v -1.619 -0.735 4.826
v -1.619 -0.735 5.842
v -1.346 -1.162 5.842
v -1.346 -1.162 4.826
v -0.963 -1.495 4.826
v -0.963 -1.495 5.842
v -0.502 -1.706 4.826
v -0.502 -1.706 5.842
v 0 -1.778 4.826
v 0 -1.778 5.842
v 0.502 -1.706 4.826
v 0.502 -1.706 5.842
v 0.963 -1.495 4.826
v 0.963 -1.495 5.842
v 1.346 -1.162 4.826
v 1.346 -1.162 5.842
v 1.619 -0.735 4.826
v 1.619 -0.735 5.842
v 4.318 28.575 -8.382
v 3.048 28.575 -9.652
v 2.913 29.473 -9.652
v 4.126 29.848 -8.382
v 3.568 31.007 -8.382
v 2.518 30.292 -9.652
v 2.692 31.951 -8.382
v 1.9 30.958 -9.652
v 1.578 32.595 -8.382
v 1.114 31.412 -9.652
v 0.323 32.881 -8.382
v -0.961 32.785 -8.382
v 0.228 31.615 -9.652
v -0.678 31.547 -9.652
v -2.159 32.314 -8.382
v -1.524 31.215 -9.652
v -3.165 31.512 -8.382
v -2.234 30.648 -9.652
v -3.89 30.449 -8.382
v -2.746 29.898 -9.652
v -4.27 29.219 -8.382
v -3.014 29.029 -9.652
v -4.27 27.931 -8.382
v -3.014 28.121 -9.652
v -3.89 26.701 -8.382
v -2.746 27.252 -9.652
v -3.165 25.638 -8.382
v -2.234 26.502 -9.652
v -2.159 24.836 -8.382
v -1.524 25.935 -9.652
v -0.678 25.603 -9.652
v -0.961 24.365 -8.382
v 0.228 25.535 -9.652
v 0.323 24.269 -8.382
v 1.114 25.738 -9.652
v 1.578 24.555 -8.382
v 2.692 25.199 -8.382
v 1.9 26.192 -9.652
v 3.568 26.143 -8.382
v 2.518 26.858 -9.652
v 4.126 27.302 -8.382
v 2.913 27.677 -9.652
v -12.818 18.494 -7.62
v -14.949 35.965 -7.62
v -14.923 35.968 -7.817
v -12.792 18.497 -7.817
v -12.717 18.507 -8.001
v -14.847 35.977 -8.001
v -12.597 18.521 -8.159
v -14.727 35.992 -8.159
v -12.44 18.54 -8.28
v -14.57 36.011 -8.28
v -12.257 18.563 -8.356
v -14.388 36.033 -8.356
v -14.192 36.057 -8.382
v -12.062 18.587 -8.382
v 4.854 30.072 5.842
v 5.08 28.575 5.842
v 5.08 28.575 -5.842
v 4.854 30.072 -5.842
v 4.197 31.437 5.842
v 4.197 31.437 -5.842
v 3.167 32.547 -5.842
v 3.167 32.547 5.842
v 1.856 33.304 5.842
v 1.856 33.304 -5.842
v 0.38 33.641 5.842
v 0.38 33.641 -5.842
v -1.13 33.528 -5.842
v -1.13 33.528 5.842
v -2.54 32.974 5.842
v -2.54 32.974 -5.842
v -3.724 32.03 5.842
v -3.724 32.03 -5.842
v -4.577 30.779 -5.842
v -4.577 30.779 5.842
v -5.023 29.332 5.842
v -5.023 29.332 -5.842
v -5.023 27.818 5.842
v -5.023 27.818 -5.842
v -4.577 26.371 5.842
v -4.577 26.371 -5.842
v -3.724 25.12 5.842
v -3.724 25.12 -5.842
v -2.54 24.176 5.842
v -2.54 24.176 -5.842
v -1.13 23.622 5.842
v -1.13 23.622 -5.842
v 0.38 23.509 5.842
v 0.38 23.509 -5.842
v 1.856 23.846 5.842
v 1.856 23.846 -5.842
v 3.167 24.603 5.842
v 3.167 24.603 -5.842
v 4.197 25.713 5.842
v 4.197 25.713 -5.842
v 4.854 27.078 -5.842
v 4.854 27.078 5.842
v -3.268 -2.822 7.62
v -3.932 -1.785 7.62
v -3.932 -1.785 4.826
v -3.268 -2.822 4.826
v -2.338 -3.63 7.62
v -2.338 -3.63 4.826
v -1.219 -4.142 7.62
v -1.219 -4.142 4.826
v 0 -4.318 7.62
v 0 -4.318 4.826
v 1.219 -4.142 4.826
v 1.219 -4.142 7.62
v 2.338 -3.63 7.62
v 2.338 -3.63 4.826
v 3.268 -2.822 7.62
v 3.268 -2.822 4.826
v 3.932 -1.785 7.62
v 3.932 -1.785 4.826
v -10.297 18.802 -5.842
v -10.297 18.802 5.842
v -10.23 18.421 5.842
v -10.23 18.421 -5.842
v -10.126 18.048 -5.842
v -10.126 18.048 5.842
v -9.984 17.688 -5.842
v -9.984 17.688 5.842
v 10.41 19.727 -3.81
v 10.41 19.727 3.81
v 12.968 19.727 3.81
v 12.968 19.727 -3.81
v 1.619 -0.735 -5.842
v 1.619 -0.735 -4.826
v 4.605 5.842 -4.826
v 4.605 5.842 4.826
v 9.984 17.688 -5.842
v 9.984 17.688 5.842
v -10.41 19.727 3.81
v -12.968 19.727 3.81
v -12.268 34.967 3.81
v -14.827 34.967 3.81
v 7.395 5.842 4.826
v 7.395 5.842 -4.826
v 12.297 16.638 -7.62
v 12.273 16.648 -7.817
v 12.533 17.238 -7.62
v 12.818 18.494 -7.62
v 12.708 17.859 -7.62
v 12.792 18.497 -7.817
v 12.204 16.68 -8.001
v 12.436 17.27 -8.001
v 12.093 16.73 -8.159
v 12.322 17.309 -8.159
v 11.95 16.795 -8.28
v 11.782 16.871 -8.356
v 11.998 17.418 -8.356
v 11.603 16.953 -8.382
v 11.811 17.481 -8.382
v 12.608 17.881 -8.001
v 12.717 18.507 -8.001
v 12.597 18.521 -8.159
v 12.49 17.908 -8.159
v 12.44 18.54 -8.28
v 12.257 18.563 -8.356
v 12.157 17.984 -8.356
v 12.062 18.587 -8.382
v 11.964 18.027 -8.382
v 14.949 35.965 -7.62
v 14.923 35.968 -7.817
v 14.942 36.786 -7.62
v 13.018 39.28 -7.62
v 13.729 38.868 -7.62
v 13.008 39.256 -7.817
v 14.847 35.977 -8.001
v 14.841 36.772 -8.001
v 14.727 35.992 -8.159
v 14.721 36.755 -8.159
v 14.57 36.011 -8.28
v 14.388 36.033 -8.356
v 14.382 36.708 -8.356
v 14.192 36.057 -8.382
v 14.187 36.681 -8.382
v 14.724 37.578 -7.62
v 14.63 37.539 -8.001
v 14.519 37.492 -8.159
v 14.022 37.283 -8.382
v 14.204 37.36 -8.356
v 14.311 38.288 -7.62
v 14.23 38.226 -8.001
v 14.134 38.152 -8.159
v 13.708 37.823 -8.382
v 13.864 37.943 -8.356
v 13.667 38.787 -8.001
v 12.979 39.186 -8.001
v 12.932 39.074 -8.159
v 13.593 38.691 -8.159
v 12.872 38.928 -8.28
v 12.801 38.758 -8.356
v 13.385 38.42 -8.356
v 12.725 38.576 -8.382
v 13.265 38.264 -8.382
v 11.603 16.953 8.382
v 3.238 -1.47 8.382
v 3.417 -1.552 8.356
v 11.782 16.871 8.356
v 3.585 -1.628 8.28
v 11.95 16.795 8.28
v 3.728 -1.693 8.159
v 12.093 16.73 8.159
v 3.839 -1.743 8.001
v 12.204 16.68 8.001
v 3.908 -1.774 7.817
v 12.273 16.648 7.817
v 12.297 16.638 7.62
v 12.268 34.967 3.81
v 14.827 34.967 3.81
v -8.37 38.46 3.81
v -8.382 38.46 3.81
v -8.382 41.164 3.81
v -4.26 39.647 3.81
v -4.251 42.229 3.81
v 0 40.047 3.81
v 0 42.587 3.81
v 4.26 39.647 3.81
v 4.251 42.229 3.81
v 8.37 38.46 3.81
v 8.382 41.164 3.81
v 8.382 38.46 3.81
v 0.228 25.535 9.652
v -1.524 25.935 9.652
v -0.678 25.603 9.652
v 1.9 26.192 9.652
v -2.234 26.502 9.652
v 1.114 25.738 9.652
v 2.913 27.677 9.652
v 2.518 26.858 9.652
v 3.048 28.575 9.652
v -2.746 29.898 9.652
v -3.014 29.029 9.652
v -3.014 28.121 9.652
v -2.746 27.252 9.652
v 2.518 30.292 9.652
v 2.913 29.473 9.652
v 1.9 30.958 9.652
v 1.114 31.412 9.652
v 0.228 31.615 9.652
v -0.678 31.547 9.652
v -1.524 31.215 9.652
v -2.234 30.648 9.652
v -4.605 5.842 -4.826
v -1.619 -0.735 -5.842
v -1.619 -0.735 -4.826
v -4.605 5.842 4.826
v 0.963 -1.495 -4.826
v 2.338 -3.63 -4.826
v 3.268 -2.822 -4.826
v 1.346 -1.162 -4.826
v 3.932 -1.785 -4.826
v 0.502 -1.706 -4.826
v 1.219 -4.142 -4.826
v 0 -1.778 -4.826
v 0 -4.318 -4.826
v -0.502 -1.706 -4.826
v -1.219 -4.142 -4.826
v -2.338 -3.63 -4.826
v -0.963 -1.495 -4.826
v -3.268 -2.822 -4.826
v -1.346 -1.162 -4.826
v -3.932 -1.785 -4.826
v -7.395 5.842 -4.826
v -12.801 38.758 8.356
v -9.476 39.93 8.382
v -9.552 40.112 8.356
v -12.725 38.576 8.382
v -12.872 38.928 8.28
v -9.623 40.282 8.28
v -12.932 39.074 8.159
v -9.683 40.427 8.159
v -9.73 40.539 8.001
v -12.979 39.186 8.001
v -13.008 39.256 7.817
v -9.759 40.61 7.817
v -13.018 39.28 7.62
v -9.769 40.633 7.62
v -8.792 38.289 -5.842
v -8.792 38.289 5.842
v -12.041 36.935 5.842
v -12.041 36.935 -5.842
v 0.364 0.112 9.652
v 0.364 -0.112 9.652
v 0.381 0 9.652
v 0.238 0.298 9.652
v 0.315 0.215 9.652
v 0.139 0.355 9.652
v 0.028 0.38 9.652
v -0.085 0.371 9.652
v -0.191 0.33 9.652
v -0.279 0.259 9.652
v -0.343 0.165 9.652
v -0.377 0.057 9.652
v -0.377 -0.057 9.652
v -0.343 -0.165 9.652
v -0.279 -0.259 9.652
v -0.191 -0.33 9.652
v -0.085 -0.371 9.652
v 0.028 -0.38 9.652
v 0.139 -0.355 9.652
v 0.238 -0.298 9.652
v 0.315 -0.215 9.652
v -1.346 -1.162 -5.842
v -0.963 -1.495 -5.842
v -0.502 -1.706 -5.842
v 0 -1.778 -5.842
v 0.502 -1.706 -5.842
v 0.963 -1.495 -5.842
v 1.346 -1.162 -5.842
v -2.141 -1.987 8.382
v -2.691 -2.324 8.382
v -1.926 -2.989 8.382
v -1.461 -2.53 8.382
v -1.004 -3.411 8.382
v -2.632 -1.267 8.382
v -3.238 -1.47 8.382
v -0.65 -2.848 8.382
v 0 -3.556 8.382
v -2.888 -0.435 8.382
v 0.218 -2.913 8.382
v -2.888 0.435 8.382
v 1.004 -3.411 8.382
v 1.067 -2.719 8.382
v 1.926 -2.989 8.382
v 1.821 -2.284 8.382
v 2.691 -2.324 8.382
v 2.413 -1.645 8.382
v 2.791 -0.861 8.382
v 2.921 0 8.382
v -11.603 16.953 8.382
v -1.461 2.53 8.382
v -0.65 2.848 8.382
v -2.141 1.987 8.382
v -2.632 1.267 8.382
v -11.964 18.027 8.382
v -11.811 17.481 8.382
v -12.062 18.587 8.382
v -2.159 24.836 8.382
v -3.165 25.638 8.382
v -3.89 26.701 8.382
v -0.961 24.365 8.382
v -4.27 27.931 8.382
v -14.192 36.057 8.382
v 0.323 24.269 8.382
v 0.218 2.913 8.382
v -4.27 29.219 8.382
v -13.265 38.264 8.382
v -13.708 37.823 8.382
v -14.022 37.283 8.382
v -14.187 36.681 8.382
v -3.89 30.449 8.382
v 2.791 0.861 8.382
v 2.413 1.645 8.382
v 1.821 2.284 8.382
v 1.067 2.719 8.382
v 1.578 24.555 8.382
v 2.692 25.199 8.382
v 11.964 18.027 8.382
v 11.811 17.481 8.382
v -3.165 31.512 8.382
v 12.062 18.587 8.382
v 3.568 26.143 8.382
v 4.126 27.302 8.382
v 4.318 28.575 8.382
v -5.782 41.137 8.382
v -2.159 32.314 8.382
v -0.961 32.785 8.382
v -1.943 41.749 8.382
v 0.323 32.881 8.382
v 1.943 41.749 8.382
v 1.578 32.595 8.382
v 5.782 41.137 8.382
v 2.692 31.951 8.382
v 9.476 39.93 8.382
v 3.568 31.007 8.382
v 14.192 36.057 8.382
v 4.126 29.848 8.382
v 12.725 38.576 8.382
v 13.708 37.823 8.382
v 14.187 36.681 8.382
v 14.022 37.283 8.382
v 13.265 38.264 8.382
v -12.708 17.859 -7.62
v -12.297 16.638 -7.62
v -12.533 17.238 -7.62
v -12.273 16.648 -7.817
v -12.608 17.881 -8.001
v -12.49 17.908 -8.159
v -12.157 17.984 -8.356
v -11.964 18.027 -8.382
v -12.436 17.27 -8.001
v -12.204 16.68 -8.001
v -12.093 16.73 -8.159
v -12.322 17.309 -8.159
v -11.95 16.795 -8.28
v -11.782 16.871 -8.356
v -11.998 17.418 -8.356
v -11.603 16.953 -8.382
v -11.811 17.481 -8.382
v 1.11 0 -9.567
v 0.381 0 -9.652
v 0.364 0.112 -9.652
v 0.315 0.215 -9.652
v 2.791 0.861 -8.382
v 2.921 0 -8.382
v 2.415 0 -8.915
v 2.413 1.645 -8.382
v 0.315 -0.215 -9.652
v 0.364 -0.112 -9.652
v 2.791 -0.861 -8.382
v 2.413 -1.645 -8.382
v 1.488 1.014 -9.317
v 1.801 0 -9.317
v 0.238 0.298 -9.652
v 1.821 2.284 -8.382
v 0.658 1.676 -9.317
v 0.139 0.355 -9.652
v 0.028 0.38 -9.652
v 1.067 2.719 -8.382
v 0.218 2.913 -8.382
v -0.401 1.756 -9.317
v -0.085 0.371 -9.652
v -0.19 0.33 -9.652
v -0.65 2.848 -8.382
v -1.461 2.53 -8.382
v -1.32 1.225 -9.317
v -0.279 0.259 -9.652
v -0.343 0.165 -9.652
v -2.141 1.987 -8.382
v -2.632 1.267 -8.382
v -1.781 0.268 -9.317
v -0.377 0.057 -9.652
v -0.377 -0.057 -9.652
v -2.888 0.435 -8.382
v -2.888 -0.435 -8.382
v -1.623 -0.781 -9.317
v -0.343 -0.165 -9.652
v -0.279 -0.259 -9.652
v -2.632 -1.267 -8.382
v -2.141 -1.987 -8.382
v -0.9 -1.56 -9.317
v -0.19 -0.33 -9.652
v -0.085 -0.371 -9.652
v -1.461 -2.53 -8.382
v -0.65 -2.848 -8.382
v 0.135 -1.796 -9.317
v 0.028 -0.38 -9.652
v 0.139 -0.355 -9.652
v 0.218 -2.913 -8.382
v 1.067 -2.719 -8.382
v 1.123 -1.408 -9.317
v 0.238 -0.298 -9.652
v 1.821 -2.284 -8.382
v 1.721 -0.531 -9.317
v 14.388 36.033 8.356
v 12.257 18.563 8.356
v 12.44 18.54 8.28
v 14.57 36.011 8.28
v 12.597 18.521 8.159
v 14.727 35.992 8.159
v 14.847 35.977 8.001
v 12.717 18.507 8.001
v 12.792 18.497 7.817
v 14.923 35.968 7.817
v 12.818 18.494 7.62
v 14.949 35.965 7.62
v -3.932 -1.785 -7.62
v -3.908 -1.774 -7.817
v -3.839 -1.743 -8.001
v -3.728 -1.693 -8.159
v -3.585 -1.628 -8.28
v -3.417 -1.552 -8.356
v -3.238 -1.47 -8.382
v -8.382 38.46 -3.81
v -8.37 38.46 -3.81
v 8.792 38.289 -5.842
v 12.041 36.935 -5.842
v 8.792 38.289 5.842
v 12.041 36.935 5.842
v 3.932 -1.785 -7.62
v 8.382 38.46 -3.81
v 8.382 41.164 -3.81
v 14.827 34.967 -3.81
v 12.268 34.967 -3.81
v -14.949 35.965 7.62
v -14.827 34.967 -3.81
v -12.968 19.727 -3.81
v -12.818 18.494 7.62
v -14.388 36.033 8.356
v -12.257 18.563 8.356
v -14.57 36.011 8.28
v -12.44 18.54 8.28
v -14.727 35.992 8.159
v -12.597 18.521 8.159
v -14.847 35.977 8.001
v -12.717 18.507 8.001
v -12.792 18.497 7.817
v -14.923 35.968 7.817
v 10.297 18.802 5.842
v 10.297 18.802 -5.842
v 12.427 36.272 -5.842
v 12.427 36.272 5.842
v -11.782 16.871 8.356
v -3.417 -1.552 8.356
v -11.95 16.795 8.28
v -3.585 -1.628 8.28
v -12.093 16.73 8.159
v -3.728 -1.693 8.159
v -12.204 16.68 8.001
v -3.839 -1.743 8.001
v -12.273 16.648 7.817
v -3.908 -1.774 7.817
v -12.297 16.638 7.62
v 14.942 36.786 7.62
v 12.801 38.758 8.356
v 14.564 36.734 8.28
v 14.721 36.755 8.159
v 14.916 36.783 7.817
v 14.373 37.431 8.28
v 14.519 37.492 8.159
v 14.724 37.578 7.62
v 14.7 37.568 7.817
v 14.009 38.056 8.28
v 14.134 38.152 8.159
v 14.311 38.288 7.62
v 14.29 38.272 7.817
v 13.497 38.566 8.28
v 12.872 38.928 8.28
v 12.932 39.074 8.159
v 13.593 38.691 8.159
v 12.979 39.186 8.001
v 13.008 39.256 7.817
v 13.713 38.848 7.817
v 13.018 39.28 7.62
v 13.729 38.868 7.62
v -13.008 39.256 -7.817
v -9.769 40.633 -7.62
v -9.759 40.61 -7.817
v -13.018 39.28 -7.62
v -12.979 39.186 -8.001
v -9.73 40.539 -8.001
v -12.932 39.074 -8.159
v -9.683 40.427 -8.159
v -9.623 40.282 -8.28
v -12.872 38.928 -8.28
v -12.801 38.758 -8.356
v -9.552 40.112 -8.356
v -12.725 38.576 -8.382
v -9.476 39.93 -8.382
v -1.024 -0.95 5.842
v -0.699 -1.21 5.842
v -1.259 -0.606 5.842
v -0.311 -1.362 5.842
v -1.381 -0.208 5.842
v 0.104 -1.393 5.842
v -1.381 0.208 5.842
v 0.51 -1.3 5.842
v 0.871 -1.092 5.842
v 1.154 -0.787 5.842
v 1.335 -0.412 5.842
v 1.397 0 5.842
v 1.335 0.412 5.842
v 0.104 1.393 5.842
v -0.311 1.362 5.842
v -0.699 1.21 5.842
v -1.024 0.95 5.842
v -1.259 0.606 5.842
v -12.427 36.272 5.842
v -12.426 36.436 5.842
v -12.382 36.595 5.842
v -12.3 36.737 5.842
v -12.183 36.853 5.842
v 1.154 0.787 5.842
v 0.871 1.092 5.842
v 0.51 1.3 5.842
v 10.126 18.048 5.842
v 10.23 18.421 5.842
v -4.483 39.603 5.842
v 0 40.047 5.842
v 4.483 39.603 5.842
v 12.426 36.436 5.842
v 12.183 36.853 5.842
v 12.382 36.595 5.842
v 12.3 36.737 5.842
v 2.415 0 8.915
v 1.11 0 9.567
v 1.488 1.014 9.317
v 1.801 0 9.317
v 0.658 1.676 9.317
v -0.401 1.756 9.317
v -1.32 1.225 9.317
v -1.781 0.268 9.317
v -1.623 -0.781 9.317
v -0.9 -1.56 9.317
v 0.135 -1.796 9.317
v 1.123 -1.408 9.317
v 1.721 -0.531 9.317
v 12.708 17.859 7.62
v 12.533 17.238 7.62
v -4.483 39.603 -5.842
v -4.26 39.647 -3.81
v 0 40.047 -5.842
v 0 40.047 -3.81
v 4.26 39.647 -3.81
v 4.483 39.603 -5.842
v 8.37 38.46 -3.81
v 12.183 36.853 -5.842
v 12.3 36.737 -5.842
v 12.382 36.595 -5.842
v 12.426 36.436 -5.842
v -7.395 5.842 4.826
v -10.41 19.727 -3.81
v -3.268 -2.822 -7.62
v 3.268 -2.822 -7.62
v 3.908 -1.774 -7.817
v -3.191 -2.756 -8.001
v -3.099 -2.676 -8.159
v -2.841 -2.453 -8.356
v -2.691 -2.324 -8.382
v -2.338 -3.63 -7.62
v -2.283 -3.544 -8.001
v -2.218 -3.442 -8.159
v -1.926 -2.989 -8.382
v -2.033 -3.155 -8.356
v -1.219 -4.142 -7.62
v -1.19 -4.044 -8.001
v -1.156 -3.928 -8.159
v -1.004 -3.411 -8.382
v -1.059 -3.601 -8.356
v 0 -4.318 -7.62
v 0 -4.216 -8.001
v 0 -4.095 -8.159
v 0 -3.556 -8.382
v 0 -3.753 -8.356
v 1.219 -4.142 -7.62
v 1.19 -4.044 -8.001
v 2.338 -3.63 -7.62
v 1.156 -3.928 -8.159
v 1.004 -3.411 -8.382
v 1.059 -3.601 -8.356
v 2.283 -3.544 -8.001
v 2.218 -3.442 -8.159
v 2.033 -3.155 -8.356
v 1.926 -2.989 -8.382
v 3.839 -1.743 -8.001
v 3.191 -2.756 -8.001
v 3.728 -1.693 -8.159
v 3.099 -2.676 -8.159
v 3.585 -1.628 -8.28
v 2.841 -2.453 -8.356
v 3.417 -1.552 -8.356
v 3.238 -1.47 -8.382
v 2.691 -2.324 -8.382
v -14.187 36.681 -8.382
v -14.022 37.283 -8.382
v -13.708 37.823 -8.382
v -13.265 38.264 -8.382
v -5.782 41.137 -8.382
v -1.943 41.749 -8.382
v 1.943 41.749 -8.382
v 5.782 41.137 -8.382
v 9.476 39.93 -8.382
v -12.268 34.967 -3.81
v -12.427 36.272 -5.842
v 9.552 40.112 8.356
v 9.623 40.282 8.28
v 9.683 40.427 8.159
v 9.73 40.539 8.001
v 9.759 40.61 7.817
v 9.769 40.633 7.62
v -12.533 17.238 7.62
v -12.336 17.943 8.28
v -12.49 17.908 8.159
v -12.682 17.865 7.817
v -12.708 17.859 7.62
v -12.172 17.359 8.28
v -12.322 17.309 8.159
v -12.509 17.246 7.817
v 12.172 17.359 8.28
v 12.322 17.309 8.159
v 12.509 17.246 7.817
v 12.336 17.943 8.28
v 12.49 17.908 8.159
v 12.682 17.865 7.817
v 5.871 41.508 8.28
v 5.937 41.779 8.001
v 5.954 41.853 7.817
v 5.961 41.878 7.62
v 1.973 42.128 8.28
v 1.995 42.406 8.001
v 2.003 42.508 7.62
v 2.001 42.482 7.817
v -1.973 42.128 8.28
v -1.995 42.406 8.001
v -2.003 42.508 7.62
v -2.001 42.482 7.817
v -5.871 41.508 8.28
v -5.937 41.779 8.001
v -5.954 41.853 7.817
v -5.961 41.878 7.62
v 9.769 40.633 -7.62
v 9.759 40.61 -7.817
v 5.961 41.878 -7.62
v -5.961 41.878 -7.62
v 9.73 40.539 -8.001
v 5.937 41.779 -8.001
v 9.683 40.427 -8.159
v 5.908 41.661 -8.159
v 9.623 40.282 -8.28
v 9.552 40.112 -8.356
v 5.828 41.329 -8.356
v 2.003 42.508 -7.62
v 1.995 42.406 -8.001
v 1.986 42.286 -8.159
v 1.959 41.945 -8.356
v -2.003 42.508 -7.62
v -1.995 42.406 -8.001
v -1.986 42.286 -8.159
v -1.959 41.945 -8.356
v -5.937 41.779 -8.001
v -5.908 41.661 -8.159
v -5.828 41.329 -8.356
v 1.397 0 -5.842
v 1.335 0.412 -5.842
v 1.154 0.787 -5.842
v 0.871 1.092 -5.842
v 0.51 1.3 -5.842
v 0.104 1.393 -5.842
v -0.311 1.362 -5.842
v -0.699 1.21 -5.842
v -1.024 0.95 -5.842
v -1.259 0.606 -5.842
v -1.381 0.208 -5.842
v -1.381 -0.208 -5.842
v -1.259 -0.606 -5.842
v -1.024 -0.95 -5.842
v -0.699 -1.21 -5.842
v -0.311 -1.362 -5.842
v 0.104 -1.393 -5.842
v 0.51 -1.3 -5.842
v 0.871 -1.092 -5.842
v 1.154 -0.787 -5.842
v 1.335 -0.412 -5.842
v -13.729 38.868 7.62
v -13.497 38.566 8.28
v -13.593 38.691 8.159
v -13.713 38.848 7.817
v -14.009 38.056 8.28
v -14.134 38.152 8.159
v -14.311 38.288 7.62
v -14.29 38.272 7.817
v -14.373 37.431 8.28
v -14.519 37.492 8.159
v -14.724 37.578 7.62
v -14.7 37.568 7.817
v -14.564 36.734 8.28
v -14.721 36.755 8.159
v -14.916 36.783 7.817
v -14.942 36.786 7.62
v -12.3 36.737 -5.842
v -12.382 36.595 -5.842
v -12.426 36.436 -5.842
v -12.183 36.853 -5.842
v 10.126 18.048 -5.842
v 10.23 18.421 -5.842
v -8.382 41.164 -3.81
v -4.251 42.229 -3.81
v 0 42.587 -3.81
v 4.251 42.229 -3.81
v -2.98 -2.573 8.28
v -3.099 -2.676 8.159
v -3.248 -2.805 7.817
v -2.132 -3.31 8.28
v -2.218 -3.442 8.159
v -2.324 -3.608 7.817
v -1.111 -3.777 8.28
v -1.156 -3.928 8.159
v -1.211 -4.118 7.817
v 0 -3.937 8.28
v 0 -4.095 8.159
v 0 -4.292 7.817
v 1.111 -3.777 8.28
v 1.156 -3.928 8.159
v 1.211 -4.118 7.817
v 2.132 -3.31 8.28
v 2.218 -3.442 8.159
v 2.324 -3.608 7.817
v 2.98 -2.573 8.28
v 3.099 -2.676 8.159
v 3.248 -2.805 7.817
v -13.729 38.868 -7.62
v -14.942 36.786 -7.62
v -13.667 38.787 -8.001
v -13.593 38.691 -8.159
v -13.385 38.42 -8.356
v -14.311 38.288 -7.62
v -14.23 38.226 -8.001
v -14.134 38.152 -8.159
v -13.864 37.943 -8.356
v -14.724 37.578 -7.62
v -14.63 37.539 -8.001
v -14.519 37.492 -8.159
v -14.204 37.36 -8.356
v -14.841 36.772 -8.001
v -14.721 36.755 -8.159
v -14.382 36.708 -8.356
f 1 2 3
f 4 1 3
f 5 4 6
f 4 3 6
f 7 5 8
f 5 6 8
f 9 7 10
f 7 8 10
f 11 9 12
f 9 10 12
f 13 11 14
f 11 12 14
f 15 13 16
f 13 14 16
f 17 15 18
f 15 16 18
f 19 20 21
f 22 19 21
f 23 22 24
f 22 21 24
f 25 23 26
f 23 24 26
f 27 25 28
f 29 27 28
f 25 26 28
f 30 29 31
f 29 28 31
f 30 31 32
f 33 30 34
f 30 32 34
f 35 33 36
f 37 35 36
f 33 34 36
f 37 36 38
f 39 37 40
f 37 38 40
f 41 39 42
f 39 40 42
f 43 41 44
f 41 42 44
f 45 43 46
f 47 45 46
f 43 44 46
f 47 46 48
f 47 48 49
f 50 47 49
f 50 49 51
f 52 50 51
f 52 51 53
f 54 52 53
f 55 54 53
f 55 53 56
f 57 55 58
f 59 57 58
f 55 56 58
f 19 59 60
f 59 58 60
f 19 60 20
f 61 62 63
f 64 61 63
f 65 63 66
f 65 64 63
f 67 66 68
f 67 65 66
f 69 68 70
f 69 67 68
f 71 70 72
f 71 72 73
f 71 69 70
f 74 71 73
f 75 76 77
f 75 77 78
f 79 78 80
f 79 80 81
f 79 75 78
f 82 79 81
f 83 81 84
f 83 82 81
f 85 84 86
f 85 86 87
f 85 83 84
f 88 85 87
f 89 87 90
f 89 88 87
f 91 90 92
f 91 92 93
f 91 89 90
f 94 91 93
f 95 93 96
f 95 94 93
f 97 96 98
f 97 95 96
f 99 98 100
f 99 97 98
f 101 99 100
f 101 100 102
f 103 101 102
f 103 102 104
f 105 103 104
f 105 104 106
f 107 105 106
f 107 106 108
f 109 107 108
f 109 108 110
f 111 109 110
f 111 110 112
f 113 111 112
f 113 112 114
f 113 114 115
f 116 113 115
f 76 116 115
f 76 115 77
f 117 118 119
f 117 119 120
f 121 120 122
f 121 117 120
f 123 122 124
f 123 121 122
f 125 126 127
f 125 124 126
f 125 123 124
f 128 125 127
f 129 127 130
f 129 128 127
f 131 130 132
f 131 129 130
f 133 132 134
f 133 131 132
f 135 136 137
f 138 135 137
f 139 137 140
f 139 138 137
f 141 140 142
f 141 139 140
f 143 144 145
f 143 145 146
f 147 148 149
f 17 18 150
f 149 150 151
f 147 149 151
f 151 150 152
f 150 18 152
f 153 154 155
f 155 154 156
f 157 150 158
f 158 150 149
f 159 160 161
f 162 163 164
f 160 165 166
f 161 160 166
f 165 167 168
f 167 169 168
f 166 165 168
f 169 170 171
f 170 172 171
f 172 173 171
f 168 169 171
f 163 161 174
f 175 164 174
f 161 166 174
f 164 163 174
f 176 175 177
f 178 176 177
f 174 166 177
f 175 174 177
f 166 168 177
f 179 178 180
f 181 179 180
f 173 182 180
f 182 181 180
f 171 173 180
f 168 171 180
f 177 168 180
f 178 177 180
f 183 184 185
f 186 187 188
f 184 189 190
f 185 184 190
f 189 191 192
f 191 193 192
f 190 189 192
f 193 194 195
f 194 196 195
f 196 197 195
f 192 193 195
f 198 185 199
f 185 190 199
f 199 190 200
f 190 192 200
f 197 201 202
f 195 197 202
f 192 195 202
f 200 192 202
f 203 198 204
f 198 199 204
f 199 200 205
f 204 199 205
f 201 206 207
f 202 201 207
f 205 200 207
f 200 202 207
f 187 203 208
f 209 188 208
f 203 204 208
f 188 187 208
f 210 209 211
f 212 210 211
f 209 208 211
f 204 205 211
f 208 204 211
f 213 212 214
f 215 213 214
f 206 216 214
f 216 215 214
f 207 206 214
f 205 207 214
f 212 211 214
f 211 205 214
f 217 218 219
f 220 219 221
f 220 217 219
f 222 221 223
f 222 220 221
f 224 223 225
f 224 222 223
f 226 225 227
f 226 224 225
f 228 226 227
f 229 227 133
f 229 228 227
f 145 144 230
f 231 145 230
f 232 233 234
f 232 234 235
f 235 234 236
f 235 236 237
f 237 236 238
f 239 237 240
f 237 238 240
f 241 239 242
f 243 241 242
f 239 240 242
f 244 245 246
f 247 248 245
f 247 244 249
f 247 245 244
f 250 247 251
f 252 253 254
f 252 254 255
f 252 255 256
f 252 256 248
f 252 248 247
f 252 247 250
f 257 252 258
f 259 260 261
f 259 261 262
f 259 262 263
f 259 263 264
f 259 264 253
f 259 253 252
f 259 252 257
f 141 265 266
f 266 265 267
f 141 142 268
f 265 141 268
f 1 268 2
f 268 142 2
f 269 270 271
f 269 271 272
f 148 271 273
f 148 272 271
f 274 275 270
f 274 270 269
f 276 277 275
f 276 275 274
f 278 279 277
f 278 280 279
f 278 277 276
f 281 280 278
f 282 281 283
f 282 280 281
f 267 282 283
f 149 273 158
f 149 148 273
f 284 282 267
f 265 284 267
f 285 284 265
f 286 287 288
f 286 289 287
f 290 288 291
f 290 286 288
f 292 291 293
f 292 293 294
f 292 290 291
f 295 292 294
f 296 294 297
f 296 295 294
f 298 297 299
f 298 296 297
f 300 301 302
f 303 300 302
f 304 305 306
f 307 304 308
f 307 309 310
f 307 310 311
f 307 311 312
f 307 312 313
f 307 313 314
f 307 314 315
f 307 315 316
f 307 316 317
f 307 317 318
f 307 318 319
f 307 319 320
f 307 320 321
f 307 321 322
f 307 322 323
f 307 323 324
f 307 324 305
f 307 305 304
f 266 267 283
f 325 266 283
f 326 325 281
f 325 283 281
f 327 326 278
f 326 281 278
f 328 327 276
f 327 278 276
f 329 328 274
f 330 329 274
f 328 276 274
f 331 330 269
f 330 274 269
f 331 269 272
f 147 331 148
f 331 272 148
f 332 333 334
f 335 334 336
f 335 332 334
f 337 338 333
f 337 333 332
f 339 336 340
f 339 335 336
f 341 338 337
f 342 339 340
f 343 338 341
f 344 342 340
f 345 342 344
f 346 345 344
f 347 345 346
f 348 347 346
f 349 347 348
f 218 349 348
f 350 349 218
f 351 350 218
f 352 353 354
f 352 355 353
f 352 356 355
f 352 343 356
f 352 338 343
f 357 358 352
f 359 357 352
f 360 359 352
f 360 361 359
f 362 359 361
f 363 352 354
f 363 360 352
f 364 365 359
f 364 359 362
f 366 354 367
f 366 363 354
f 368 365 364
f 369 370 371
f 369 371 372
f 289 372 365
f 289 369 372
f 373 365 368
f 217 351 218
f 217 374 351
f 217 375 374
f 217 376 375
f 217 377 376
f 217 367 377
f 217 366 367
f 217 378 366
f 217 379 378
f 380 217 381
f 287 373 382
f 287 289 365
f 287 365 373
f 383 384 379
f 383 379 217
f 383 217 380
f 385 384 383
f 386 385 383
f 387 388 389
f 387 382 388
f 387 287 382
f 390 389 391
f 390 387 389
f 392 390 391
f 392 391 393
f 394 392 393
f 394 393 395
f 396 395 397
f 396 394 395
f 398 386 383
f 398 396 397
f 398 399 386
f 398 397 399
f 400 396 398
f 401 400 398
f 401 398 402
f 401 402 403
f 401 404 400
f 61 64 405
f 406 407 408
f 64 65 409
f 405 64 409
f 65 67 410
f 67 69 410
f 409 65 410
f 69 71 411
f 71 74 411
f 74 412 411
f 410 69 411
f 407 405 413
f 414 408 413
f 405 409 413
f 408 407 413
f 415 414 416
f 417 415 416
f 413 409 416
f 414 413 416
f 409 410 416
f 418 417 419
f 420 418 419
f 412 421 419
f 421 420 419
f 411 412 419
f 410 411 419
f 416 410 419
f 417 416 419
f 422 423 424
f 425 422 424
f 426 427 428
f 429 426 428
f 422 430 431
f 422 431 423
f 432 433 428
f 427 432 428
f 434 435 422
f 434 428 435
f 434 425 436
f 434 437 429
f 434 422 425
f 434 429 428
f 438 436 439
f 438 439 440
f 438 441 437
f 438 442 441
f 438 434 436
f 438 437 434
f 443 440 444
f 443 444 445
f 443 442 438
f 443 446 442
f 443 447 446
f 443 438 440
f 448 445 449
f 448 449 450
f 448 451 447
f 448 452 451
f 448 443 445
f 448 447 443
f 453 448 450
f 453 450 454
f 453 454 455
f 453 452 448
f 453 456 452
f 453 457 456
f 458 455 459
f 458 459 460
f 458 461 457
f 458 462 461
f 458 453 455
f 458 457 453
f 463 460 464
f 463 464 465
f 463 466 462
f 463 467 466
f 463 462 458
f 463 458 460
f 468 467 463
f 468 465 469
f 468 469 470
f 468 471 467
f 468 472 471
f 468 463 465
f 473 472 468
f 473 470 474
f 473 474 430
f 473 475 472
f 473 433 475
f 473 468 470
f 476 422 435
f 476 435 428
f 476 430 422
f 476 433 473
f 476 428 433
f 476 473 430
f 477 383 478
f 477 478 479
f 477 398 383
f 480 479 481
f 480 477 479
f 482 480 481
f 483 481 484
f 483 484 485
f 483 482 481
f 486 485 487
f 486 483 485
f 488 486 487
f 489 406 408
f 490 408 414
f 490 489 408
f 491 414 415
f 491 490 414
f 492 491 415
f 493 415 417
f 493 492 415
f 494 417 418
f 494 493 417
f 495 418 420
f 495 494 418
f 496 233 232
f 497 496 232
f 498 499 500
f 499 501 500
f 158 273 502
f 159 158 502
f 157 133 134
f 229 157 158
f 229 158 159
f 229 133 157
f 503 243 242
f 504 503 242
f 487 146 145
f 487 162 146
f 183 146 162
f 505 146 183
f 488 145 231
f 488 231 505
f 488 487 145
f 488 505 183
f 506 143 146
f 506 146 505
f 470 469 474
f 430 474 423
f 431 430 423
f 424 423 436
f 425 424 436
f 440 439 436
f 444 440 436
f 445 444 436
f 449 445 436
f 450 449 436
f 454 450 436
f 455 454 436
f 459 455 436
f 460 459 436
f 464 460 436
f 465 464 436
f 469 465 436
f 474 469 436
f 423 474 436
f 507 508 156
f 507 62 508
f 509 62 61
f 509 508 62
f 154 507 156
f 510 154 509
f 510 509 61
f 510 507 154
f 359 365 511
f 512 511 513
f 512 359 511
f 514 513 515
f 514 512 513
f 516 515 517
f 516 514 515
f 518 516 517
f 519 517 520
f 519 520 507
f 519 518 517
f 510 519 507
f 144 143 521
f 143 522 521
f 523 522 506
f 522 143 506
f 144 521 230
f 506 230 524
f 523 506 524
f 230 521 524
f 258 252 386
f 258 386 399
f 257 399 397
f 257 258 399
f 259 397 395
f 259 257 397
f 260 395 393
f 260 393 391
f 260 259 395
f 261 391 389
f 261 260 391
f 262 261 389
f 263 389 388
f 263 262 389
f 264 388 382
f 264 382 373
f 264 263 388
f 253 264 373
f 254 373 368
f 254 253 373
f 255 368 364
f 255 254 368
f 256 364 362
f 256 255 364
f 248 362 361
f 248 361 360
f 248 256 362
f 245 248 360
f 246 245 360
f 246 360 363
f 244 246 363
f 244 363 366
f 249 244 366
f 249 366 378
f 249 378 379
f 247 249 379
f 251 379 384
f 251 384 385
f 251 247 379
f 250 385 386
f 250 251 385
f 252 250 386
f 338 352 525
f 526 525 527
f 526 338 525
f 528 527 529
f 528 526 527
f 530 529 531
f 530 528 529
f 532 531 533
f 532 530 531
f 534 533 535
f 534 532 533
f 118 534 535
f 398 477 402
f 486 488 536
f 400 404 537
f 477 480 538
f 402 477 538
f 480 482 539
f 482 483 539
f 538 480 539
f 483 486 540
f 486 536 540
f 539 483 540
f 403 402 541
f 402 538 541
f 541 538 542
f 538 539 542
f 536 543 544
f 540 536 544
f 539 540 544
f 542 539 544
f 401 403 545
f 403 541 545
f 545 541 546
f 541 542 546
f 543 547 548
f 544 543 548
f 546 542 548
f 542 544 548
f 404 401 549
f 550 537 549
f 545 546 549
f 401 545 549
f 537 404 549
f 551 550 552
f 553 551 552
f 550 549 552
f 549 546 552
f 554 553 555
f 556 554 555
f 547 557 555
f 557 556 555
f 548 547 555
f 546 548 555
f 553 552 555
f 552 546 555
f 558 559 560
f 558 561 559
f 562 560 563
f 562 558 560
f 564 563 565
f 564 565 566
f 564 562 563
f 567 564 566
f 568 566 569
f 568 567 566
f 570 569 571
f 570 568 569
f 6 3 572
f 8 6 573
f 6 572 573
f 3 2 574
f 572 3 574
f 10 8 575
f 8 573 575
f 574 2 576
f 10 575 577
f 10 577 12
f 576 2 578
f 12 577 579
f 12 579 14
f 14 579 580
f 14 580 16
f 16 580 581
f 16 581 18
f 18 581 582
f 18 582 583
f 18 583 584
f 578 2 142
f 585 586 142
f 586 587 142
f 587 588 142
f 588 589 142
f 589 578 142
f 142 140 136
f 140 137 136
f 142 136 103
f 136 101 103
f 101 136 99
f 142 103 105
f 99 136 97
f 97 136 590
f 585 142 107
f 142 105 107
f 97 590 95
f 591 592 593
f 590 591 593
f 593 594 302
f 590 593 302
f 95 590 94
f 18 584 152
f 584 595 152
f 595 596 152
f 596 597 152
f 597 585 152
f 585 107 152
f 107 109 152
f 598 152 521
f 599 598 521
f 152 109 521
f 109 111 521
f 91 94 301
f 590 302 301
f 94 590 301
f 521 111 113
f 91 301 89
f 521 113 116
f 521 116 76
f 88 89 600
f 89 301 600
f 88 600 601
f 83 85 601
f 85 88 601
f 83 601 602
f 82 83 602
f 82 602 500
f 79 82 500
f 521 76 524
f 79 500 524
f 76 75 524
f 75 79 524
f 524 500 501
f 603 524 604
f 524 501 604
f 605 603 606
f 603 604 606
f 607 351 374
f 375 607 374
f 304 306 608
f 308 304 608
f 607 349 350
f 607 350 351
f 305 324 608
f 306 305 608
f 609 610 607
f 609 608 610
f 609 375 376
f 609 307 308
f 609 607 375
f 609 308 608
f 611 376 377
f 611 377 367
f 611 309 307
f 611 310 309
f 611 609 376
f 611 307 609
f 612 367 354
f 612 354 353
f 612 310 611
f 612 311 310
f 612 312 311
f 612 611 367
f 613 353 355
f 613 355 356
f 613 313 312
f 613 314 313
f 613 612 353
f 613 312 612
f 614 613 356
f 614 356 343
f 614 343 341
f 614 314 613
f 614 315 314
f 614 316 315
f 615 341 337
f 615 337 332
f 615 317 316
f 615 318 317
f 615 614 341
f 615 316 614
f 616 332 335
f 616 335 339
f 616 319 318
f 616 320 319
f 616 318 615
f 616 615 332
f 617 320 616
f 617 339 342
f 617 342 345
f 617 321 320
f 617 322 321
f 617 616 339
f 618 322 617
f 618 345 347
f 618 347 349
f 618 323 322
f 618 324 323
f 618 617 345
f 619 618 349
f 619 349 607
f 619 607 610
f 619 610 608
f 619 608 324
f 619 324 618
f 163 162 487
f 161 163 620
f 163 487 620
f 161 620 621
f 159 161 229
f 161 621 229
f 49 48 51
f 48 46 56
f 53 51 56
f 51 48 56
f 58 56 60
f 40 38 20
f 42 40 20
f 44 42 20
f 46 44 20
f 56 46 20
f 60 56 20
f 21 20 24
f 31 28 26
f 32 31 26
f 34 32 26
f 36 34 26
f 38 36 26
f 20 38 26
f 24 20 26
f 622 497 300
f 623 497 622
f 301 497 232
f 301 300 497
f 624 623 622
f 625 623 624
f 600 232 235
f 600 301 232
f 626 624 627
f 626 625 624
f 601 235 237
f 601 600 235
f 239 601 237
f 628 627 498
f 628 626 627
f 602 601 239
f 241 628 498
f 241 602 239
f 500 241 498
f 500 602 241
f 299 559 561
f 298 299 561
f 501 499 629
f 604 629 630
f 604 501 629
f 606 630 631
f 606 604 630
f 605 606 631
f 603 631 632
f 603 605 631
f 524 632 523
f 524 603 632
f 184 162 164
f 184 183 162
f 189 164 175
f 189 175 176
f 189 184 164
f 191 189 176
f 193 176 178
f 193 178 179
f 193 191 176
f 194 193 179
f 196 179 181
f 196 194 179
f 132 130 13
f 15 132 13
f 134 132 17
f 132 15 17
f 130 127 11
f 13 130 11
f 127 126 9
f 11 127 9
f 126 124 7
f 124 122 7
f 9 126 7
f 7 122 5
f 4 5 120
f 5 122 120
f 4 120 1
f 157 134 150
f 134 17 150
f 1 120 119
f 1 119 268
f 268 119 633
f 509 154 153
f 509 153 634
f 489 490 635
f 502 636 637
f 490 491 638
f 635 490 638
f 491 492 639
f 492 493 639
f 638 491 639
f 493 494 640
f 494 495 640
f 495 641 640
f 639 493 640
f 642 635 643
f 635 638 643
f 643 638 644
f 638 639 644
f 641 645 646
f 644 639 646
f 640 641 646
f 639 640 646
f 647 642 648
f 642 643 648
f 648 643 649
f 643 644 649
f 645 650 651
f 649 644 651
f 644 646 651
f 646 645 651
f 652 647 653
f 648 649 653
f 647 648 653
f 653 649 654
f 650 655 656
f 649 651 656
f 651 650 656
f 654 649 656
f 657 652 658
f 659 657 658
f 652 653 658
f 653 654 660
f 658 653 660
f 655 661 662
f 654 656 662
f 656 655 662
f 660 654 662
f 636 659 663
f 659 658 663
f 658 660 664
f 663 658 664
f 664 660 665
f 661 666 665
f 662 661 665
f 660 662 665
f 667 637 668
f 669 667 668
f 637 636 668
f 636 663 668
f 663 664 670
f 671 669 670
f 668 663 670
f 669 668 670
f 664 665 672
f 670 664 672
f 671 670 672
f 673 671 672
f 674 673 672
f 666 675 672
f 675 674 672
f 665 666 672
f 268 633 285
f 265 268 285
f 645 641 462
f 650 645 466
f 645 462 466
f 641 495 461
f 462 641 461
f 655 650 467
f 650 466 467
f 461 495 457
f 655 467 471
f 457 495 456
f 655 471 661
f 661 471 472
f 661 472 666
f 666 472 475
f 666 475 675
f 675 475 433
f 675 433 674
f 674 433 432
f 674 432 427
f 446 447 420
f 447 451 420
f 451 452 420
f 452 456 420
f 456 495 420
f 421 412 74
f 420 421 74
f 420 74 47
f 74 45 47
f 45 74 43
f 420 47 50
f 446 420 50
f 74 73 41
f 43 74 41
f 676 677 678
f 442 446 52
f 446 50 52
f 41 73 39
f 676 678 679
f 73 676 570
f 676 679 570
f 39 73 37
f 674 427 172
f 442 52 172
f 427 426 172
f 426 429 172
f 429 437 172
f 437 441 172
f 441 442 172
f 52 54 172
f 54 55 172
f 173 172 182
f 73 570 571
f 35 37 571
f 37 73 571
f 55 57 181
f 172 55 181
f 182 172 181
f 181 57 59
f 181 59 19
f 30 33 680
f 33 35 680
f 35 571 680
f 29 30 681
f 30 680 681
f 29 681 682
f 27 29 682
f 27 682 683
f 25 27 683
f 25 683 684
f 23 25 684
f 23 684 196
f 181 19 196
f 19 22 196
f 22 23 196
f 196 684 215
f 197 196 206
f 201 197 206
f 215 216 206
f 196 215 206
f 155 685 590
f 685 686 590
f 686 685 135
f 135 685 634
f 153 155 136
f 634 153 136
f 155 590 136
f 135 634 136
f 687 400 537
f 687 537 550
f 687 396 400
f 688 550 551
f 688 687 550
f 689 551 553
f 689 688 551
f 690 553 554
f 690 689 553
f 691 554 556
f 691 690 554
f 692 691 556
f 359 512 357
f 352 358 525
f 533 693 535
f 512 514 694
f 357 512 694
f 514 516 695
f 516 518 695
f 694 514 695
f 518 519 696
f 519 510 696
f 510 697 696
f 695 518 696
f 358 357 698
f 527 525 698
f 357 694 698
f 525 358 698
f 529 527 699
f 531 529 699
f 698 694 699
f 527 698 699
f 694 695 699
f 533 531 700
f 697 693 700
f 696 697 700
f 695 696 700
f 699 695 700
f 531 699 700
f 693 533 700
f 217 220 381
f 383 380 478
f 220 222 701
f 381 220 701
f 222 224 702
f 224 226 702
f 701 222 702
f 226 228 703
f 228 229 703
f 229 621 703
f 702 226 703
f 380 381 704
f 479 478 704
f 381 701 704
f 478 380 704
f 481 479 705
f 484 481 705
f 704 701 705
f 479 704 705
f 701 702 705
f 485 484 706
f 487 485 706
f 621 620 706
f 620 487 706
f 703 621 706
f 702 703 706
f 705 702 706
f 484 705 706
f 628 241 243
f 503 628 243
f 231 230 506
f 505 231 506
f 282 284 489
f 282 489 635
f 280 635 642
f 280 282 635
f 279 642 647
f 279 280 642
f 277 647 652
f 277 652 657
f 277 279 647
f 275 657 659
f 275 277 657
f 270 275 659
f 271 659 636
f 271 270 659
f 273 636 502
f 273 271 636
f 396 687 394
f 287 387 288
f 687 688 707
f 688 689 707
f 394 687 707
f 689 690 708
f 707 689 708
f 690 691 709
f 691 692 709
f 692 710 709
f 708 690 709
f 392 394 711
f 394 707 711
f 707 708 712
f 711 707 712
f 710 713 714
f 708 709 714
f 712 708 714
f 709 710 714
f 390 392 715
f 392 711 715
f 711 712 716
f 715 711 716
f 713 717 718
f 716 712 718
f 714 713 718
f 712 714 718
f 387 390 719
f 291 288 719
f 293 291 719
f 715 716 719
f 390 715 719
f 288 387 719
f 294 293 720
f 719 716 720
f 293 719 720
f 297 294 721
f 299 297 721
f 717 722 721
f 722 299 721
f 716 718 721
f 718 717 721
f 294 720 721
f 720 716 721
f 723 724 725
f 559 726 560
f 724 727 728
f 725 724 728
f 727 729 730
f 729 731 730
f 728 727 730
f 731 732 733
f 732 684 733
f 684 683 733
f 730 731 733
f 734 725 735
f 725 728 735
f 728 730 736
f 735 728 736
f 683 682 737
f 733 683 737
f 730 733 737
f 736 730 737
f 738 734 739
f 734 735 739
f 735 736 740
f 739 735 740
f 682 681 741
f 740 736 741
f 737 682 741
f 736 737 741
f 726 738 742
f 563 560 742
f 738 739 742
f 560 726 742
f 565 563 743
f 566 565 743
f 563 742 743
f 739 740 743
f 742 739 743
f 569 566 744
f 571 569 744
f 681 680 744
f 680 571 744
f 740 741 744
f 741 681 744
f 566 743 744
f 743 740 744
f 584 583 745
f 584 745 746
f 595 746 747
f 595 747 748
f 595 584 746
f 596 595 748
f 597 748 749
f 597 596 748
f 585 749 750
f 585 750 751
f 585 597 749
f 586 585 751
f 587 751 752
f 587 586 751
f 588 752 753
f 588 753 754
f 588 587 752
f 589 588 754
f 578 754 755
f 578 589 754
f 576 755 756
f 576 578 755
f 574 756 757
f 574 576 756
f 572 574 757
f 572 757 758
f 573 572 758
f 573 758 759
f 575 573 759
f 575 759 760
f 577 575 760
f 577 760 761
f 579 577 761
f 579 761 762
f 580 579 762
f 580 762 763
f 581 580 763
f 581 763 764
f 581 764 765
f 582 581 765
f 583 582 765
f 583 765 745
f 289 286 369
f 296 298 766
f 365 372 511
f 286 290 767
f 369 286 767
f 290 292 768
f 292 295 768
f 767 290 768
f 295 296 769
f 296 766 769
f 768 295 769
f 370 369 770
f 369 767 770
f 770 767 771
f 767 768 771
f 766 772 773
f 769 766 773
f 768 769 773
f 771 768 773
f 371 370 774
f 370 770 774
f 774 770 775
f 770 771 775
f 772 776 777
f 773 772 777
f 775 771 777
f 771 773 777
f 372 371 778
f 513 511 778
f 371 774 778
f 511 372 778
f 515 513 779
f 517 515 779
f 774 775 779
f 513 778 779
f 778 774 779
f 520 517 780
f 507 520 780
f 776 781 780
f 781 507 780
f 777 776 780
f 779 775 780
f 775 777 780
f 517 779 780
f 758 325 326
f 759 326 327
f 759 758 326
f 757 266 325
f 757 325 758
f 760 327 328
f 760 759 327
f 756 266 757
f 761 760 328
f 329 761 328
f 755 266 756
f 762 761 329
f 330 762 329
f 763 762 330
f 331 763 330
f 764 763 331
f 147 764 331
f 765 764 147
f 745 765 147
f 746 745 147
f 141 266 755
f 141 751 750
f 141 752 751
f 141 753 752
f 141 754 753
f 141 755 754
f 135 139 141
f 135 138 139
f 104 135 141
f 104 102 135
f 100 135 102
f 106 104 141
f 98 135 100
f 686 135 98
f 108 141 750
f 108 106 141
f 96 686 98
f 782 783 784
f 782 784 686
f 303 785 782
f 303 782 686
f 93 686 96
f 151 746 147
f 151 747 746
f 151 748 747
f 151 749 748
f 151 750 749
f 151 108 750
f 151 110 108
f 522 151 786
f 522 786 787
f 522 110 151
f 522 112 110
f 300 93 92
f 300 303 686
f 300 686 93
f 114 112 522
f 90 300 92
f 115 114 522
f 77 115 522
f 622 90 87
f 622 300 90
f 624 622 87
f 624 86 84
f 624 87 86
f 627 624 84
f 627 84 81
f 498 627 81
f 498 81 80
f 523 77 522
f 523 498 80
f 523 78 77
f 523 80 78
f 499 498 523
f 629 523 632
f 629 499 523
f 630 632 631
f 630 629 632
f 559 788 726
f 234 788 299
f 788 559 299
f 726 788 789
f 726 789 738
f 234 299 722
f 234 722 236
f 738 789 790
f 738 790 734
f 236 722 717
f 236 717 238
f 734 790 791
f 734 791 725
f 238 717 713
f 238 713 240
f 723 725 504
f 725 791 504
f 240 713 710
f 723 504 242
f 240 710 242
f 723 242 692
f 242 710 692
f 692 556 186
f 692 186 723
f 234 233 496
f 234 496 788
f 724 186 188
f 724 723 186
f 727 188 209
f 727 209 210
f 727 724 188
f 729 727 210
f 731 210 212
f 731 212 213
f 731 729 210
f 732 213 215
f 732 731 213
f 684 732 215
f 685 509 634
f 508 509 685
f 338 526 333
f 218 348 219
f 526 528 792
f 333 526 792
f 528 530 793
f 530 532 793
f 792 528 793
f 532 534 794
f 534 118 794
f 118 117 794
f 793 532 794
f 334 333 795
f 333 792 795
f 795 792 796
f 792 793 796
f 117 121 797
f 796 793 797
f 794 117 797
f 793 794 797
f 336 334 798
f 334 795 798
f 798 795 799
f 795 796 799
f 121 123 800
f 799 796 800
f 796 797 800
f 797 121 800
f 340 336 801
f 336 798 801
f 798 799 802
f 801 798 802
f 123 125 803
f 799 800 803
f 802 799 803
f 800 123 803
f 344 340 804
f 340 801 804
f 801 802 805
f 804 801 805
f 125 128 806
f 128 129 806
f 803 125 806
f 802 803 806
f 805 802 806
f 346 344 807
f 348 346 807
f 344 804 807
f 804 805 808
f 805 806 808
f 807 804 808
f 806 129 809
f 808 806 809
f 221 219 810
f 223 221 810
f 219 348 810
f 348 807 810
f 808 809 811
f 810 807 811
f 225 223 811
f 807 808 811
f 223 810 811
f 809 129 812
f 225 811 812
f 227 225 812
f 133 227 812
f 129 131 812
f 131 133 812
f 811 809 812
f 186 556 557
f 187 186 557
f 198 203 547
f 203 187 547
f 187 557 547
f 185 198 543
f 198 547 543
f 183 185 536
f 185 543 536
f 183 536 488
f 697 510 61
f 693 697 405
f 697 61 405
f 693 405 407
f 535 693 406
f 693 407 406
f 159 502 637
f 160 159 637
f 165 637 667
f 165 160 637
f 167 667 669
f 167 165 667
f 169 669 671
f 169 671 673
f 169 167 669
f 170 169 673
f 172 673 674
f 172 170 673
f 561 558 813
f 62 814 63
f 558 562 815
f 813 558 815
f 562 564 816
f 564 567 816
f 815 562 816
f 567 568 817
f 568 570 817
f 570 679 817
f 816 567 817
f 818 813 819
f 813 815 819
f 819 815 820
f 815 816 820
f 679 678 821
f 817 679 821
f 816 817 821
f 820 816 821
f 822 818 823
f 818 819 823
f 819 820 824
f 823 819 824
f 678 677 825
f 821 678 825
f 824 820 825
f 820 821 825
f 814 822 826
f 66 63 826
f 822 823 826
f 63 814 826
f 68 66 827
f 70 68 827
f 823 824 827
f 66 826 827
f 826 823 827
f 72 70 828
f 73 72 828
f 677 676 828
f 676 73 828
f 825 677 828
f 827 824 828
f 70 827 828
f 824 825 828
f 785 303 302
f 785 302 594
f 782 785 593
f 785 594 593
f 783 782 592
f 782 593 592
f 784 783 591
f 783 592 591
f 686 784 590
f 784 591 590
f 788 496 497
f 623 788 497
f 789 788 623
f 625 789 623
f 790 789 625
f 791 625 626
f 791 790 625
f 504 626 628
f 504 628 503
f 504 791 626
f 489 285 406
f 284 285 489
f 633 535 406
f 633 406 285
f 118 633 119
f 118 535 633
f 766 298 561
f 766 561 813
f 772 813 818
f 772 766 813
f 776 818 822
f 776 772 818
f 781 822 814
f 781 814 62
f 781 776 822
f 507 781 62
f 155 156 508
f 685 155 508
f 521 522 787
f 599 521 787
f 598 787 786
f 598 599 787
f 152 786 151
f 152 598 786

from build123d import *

# Parameters (mm, degrees)
BOSS_EXTRUDE1_DEPTH     = 8.382
FILLET1_R               = 25.4
FILLET2_R               = 3.175
FILLET3_R               = 6.35
SHELL1_T                = 2.54
CUT_EXTRUDE1_DEPTH      = 46.914035814
CUT_EXTRUDE1_DEPTH_BACK = 46.914035814
SKETCH2_W               = 9.652
SKETCH2_H               = 10.16
SKETCH3_R               = 1.397
BOSS_EXTRUDE2_DEPTH     = 16.764
SKETCH4_R               = 2.921
BOSS_EXTRUDE3_DEPTH     = 1.27
FILLET4_R               = 3.175
CUT_EXTRUDE2_DEPTH      = 47.162775769
CUT_EXTRUDE2_DEPTH_BACK = 47.162775769
SKETCH5_W               = 7.62
SKETCH5_H               = 15.24
SKETCH6_R               = 5.08
BOSS_EXTRUDE4_DEPTH     = 16.764
SKETCH7_R               = 4.318
BOSS_EXTRUDE5_DEPTH     = 1.27
CHAMFER1_SIZE           = 1.27
SKETCH9_W               = 16.764
SKETCH9_H               = 12.7
CUT_EXTRUDE3_DEPTH      = 3.81
FILLET5_R               = 0.762


# Some blends are built 0.0001 mm under size
with BuildPart() as part:
    # Sketch1 → Boss-Extrude1 (new, symmetric)
    with BuildSketch(Plane.XY):
        with BuildLine():
            Line((3.931691361, -1.785196639), (12.7, 17.526))
            Line((12.7, 17.526), (15.24, 38.354))
            Line((15.24, 38.354), (0, 44.704))
            Line((0, 44.704), (-15.24, 38.354))
            Line((-15.24, 38.354), (-12.7, 17.526))
            Line((-12.7, 17.526), (-3.931691361, -1.785196639))
            ThreePointArc((-3.931691361, -1.785196639), (0, -4.318), (3.931691361, -1.785196639))
        make_face()
    extrude(amount=BOSS_EXTRUDE1_DEPTH, both=True)

    # Fillet1
    fillet1_edges = [part.edges().sort_by_distance(p)[0] for p in [
        (0, 44.704, 0),
    ]]
    fillet(fillet1_edges, radius=FILLET1_R)

    # Fillet2
    fillet2_edges = [part.edges().sort_by_distance(p)[0] for p in [
        (-15.24, 38.354, 0),
        (15.24, 38.354, 0),
    ]]
    fillet(fillet2_edges, radius=FILLET2_R)

    # Fillet3
    fillet3_edges = [part.edges().sort_by_distance(p)[0] for p in [
        (-12.7, 17.526, 0),
        (12.7, 17.526, 0),
    ]]
    fillet(fillet3_edges, radius=FILLET3_R)

    # Shell1 (no face opened: a closed hollow body)
    add(offset(amount=-SHELL1_T, mode=Mode.PRIVATE), mode=Mode.SUBTRACT)

    # Sketch2 → Cut-Extrude1 (cut, two sides: drawn at the far end of the back side and taken through both)
    with BuildSketch(Plane(origin=(0, 0, 0), x_dir=(0, 0, -1), z_dir=(1, 0, 0)).offset(-CUT_EXTRUDE1_DEPTH_BACK)):
        with Locations((0, 0.762)):
            Rectangle(SKETCH2_W, SKETCH2_H)
    extrude(amount=CUT_EXTRUDE1_DEPTH + CUT_EXTRUDE1_DEPTH_BACK, mode=Mode.SUBTRACT)

    # Sketch3 → Boss-Extrude2 (add)
    with BuildSketch(Plane.XY.offset(8.382)):
        Circle(SKETCH3_R)
    extrude(amount=-BOSS_EXTRUDE2_DEPTH)

    # Sketch4 → Boss-Extrude3 (add)
    with BuildSketch(Plane.XY.offset(8.382)):
        Circle(SKETCH4_R)
    boss_extrude3 = extrude(amount=BOSS_EXTRUDE3_DEPTH)

    # Mirror1: Boss-Extrude3 across plane
    add(boss_extrude3.mirror(Plane.XY))

    # Fillet4
    # the kernel refuses this fillet: 3.175 mm, written as the material it takes off along each edge
    with BuildSketch(Plane(origin=(0, 0, 9.652), x_dir=(1, 0, 0), z_dir=(0, -1, 0))) as fillet4_piece_1:
        with BuildLine():
            CenterArc((0.381, -3.175), FILLET4_R, 36.869897646, 53.130102354)
            Line((0.381, 0), (0.381, 0.0635))
            Line((0.381, 0.0635), (2.921, 0.0635))
            Line((2.921, 0.0635), (2.9845, 0))
            ThreePointArc((2.9845, 0), (2.9845, -0.635), (2.9718, -1.2319))
            Line((2.9718, -1.2319), (2.921, -1.27))
        make_face()
    revolve(axis=Axis((0, 0, 9.652), (0, 0, 1)), mode=Mode.SUBTRACT)
    with BuildSketch(Plane(origin=(0, 0, -9.652), x_dir=(1, 0, 0), z_dir=(0, -1, 0))) as fillet4_piece_2:
        with BuildLine():
            CenterArc((0.381, 3.175), FILLET4_R, 270, 53.130102354)
            Line((0.381, 0), (0.381, -0.0635))
            Line((0.381, -0.0635), (2.921, -0.0635))
            Line((2.921, -0.0635), (2.9845, 0))
            ThreePointArc((2.9845, 0), (2.9845, 0.635), (2.9718, 1.2319))
            Line((2.9718, 1.2319), (2.921, 1.27))
        make_face()
    revolve(axis=Axis((0, 0, -9.652), (0, 0, 1)), mode=Mode.SUBTRACT)

    # Sketch5 → Cut-Extrude2 (cut, two sides: drawn at the far end of the back side and taken through both)
    with BuildSketch(Plane(origin=(0, 0, 0), x_dir=(0, 0, -1), z_dir=(1, 0, 0)).offset(-CUT_EXTRUDE2_DEPTH_BACK)):
        with Locations((0, 27.347333333)):
            Rectangle(SKETCH5_W, SKETCH5_H)
    extrude(amount=CUT_EXTRUDE2_DEPTH + CUT_EXTRUDE2_DEPTH_BACK, mode=Mode.SUBTRACT)

    # Sketch6 → Boss-Extrude4 (add)
    with BuildSketch(Plane.XY.offset(8.382)):
        with Locations((0, 28.575)):
            Circle(SKETCH6_R)
    extrude(amount=-BOSS_EXTRUDE4_DEPTH)

    # Sketch7 → Boss-Extrude5 (add)
    with BuildSketch(Plane.XY.offset(8.382)):
        with Locations((0, 28.575)):
            Circle(SKETCH7_R)
    boss_extrude5 = extrude(amount=BOSS_EXTRUDE5_DEPTH)

    # Mirror2: Boss-Extrude5 across plane
    add(boss_extrude5.mirror(Plane.XY))

    # Chamfer1
    chamfer1_edges = [part.edges().sort_by_distance(p)[0] for p in [
        (-4.318, 28.575, 9.652),
        (-4.318, 28.575, -9.652),
    ]]
    chamfer(chamfer1_edges, length=CHAMFER1_SIZE - 0.0001)  # a hair under: the kernel refuses the full size

    # Sketch9 → Cut-Extrude3 (cut, symmetric)
    with BuildSketch(Plane.XY):
        with Locations((0, 44.809833333)):
            Rectangle(SKETCH9_W, SKETCH9_H)
    extrude(amount=CUT_EXTRUDE3_DEPTH, both=True, mode=Mode.SUBTRACT)

    # Fillet5
    fillet5_edges = [part.edges().sort_by_distance(p)[0] for p in [
        (-11.393675882, 39.956635049, -8.382),
        (-11.393675882, 39.956635049, 8.382),
        (0, 42.587333333, -8.382),
        (0, 42.587333333, 8.382),
        (11.393675882, 39.956635049, -8.382),
        (11.393675882, 39.956635049, 8.382),
        (-13.88335447, 27.229506655, -8.382),
        (-14.540660788, 37.946752783, -8.382),
        (14.540660788, 37.946752783, -8.382),
        (-13.88335447, 27.229506655, 8.382),
        (-14.540660788, 37.946752783, 8.382),
        (14.540660788, 37.946752783, 8.382),
        (0, -4.318, 8.382),
        (13.88335447, 27.229506655, -8.382),
        (13.88335447, 27.229506655, 8.382),
        (-8.114190115, 7.426278367, -8.382),
        (-12.628279179, 17.546141938, -8.382),
        (12.628279179, 17.546141938, -8.382),
        (-8.114190115, 7.426278367, 8.382),
        (-12.628279179, 17.546141938, 8.382),
        (12.628279179, 17.546141938, 8.382),
        (8.114190115, 7.426278367, 8.382),
        (8.114190115, 7.426278367, -8.382),
        (0, -4.318, -8.382),
    ]]
    fillet(fillet5_edges, radius=FILLET5_R)


solid = part.part
